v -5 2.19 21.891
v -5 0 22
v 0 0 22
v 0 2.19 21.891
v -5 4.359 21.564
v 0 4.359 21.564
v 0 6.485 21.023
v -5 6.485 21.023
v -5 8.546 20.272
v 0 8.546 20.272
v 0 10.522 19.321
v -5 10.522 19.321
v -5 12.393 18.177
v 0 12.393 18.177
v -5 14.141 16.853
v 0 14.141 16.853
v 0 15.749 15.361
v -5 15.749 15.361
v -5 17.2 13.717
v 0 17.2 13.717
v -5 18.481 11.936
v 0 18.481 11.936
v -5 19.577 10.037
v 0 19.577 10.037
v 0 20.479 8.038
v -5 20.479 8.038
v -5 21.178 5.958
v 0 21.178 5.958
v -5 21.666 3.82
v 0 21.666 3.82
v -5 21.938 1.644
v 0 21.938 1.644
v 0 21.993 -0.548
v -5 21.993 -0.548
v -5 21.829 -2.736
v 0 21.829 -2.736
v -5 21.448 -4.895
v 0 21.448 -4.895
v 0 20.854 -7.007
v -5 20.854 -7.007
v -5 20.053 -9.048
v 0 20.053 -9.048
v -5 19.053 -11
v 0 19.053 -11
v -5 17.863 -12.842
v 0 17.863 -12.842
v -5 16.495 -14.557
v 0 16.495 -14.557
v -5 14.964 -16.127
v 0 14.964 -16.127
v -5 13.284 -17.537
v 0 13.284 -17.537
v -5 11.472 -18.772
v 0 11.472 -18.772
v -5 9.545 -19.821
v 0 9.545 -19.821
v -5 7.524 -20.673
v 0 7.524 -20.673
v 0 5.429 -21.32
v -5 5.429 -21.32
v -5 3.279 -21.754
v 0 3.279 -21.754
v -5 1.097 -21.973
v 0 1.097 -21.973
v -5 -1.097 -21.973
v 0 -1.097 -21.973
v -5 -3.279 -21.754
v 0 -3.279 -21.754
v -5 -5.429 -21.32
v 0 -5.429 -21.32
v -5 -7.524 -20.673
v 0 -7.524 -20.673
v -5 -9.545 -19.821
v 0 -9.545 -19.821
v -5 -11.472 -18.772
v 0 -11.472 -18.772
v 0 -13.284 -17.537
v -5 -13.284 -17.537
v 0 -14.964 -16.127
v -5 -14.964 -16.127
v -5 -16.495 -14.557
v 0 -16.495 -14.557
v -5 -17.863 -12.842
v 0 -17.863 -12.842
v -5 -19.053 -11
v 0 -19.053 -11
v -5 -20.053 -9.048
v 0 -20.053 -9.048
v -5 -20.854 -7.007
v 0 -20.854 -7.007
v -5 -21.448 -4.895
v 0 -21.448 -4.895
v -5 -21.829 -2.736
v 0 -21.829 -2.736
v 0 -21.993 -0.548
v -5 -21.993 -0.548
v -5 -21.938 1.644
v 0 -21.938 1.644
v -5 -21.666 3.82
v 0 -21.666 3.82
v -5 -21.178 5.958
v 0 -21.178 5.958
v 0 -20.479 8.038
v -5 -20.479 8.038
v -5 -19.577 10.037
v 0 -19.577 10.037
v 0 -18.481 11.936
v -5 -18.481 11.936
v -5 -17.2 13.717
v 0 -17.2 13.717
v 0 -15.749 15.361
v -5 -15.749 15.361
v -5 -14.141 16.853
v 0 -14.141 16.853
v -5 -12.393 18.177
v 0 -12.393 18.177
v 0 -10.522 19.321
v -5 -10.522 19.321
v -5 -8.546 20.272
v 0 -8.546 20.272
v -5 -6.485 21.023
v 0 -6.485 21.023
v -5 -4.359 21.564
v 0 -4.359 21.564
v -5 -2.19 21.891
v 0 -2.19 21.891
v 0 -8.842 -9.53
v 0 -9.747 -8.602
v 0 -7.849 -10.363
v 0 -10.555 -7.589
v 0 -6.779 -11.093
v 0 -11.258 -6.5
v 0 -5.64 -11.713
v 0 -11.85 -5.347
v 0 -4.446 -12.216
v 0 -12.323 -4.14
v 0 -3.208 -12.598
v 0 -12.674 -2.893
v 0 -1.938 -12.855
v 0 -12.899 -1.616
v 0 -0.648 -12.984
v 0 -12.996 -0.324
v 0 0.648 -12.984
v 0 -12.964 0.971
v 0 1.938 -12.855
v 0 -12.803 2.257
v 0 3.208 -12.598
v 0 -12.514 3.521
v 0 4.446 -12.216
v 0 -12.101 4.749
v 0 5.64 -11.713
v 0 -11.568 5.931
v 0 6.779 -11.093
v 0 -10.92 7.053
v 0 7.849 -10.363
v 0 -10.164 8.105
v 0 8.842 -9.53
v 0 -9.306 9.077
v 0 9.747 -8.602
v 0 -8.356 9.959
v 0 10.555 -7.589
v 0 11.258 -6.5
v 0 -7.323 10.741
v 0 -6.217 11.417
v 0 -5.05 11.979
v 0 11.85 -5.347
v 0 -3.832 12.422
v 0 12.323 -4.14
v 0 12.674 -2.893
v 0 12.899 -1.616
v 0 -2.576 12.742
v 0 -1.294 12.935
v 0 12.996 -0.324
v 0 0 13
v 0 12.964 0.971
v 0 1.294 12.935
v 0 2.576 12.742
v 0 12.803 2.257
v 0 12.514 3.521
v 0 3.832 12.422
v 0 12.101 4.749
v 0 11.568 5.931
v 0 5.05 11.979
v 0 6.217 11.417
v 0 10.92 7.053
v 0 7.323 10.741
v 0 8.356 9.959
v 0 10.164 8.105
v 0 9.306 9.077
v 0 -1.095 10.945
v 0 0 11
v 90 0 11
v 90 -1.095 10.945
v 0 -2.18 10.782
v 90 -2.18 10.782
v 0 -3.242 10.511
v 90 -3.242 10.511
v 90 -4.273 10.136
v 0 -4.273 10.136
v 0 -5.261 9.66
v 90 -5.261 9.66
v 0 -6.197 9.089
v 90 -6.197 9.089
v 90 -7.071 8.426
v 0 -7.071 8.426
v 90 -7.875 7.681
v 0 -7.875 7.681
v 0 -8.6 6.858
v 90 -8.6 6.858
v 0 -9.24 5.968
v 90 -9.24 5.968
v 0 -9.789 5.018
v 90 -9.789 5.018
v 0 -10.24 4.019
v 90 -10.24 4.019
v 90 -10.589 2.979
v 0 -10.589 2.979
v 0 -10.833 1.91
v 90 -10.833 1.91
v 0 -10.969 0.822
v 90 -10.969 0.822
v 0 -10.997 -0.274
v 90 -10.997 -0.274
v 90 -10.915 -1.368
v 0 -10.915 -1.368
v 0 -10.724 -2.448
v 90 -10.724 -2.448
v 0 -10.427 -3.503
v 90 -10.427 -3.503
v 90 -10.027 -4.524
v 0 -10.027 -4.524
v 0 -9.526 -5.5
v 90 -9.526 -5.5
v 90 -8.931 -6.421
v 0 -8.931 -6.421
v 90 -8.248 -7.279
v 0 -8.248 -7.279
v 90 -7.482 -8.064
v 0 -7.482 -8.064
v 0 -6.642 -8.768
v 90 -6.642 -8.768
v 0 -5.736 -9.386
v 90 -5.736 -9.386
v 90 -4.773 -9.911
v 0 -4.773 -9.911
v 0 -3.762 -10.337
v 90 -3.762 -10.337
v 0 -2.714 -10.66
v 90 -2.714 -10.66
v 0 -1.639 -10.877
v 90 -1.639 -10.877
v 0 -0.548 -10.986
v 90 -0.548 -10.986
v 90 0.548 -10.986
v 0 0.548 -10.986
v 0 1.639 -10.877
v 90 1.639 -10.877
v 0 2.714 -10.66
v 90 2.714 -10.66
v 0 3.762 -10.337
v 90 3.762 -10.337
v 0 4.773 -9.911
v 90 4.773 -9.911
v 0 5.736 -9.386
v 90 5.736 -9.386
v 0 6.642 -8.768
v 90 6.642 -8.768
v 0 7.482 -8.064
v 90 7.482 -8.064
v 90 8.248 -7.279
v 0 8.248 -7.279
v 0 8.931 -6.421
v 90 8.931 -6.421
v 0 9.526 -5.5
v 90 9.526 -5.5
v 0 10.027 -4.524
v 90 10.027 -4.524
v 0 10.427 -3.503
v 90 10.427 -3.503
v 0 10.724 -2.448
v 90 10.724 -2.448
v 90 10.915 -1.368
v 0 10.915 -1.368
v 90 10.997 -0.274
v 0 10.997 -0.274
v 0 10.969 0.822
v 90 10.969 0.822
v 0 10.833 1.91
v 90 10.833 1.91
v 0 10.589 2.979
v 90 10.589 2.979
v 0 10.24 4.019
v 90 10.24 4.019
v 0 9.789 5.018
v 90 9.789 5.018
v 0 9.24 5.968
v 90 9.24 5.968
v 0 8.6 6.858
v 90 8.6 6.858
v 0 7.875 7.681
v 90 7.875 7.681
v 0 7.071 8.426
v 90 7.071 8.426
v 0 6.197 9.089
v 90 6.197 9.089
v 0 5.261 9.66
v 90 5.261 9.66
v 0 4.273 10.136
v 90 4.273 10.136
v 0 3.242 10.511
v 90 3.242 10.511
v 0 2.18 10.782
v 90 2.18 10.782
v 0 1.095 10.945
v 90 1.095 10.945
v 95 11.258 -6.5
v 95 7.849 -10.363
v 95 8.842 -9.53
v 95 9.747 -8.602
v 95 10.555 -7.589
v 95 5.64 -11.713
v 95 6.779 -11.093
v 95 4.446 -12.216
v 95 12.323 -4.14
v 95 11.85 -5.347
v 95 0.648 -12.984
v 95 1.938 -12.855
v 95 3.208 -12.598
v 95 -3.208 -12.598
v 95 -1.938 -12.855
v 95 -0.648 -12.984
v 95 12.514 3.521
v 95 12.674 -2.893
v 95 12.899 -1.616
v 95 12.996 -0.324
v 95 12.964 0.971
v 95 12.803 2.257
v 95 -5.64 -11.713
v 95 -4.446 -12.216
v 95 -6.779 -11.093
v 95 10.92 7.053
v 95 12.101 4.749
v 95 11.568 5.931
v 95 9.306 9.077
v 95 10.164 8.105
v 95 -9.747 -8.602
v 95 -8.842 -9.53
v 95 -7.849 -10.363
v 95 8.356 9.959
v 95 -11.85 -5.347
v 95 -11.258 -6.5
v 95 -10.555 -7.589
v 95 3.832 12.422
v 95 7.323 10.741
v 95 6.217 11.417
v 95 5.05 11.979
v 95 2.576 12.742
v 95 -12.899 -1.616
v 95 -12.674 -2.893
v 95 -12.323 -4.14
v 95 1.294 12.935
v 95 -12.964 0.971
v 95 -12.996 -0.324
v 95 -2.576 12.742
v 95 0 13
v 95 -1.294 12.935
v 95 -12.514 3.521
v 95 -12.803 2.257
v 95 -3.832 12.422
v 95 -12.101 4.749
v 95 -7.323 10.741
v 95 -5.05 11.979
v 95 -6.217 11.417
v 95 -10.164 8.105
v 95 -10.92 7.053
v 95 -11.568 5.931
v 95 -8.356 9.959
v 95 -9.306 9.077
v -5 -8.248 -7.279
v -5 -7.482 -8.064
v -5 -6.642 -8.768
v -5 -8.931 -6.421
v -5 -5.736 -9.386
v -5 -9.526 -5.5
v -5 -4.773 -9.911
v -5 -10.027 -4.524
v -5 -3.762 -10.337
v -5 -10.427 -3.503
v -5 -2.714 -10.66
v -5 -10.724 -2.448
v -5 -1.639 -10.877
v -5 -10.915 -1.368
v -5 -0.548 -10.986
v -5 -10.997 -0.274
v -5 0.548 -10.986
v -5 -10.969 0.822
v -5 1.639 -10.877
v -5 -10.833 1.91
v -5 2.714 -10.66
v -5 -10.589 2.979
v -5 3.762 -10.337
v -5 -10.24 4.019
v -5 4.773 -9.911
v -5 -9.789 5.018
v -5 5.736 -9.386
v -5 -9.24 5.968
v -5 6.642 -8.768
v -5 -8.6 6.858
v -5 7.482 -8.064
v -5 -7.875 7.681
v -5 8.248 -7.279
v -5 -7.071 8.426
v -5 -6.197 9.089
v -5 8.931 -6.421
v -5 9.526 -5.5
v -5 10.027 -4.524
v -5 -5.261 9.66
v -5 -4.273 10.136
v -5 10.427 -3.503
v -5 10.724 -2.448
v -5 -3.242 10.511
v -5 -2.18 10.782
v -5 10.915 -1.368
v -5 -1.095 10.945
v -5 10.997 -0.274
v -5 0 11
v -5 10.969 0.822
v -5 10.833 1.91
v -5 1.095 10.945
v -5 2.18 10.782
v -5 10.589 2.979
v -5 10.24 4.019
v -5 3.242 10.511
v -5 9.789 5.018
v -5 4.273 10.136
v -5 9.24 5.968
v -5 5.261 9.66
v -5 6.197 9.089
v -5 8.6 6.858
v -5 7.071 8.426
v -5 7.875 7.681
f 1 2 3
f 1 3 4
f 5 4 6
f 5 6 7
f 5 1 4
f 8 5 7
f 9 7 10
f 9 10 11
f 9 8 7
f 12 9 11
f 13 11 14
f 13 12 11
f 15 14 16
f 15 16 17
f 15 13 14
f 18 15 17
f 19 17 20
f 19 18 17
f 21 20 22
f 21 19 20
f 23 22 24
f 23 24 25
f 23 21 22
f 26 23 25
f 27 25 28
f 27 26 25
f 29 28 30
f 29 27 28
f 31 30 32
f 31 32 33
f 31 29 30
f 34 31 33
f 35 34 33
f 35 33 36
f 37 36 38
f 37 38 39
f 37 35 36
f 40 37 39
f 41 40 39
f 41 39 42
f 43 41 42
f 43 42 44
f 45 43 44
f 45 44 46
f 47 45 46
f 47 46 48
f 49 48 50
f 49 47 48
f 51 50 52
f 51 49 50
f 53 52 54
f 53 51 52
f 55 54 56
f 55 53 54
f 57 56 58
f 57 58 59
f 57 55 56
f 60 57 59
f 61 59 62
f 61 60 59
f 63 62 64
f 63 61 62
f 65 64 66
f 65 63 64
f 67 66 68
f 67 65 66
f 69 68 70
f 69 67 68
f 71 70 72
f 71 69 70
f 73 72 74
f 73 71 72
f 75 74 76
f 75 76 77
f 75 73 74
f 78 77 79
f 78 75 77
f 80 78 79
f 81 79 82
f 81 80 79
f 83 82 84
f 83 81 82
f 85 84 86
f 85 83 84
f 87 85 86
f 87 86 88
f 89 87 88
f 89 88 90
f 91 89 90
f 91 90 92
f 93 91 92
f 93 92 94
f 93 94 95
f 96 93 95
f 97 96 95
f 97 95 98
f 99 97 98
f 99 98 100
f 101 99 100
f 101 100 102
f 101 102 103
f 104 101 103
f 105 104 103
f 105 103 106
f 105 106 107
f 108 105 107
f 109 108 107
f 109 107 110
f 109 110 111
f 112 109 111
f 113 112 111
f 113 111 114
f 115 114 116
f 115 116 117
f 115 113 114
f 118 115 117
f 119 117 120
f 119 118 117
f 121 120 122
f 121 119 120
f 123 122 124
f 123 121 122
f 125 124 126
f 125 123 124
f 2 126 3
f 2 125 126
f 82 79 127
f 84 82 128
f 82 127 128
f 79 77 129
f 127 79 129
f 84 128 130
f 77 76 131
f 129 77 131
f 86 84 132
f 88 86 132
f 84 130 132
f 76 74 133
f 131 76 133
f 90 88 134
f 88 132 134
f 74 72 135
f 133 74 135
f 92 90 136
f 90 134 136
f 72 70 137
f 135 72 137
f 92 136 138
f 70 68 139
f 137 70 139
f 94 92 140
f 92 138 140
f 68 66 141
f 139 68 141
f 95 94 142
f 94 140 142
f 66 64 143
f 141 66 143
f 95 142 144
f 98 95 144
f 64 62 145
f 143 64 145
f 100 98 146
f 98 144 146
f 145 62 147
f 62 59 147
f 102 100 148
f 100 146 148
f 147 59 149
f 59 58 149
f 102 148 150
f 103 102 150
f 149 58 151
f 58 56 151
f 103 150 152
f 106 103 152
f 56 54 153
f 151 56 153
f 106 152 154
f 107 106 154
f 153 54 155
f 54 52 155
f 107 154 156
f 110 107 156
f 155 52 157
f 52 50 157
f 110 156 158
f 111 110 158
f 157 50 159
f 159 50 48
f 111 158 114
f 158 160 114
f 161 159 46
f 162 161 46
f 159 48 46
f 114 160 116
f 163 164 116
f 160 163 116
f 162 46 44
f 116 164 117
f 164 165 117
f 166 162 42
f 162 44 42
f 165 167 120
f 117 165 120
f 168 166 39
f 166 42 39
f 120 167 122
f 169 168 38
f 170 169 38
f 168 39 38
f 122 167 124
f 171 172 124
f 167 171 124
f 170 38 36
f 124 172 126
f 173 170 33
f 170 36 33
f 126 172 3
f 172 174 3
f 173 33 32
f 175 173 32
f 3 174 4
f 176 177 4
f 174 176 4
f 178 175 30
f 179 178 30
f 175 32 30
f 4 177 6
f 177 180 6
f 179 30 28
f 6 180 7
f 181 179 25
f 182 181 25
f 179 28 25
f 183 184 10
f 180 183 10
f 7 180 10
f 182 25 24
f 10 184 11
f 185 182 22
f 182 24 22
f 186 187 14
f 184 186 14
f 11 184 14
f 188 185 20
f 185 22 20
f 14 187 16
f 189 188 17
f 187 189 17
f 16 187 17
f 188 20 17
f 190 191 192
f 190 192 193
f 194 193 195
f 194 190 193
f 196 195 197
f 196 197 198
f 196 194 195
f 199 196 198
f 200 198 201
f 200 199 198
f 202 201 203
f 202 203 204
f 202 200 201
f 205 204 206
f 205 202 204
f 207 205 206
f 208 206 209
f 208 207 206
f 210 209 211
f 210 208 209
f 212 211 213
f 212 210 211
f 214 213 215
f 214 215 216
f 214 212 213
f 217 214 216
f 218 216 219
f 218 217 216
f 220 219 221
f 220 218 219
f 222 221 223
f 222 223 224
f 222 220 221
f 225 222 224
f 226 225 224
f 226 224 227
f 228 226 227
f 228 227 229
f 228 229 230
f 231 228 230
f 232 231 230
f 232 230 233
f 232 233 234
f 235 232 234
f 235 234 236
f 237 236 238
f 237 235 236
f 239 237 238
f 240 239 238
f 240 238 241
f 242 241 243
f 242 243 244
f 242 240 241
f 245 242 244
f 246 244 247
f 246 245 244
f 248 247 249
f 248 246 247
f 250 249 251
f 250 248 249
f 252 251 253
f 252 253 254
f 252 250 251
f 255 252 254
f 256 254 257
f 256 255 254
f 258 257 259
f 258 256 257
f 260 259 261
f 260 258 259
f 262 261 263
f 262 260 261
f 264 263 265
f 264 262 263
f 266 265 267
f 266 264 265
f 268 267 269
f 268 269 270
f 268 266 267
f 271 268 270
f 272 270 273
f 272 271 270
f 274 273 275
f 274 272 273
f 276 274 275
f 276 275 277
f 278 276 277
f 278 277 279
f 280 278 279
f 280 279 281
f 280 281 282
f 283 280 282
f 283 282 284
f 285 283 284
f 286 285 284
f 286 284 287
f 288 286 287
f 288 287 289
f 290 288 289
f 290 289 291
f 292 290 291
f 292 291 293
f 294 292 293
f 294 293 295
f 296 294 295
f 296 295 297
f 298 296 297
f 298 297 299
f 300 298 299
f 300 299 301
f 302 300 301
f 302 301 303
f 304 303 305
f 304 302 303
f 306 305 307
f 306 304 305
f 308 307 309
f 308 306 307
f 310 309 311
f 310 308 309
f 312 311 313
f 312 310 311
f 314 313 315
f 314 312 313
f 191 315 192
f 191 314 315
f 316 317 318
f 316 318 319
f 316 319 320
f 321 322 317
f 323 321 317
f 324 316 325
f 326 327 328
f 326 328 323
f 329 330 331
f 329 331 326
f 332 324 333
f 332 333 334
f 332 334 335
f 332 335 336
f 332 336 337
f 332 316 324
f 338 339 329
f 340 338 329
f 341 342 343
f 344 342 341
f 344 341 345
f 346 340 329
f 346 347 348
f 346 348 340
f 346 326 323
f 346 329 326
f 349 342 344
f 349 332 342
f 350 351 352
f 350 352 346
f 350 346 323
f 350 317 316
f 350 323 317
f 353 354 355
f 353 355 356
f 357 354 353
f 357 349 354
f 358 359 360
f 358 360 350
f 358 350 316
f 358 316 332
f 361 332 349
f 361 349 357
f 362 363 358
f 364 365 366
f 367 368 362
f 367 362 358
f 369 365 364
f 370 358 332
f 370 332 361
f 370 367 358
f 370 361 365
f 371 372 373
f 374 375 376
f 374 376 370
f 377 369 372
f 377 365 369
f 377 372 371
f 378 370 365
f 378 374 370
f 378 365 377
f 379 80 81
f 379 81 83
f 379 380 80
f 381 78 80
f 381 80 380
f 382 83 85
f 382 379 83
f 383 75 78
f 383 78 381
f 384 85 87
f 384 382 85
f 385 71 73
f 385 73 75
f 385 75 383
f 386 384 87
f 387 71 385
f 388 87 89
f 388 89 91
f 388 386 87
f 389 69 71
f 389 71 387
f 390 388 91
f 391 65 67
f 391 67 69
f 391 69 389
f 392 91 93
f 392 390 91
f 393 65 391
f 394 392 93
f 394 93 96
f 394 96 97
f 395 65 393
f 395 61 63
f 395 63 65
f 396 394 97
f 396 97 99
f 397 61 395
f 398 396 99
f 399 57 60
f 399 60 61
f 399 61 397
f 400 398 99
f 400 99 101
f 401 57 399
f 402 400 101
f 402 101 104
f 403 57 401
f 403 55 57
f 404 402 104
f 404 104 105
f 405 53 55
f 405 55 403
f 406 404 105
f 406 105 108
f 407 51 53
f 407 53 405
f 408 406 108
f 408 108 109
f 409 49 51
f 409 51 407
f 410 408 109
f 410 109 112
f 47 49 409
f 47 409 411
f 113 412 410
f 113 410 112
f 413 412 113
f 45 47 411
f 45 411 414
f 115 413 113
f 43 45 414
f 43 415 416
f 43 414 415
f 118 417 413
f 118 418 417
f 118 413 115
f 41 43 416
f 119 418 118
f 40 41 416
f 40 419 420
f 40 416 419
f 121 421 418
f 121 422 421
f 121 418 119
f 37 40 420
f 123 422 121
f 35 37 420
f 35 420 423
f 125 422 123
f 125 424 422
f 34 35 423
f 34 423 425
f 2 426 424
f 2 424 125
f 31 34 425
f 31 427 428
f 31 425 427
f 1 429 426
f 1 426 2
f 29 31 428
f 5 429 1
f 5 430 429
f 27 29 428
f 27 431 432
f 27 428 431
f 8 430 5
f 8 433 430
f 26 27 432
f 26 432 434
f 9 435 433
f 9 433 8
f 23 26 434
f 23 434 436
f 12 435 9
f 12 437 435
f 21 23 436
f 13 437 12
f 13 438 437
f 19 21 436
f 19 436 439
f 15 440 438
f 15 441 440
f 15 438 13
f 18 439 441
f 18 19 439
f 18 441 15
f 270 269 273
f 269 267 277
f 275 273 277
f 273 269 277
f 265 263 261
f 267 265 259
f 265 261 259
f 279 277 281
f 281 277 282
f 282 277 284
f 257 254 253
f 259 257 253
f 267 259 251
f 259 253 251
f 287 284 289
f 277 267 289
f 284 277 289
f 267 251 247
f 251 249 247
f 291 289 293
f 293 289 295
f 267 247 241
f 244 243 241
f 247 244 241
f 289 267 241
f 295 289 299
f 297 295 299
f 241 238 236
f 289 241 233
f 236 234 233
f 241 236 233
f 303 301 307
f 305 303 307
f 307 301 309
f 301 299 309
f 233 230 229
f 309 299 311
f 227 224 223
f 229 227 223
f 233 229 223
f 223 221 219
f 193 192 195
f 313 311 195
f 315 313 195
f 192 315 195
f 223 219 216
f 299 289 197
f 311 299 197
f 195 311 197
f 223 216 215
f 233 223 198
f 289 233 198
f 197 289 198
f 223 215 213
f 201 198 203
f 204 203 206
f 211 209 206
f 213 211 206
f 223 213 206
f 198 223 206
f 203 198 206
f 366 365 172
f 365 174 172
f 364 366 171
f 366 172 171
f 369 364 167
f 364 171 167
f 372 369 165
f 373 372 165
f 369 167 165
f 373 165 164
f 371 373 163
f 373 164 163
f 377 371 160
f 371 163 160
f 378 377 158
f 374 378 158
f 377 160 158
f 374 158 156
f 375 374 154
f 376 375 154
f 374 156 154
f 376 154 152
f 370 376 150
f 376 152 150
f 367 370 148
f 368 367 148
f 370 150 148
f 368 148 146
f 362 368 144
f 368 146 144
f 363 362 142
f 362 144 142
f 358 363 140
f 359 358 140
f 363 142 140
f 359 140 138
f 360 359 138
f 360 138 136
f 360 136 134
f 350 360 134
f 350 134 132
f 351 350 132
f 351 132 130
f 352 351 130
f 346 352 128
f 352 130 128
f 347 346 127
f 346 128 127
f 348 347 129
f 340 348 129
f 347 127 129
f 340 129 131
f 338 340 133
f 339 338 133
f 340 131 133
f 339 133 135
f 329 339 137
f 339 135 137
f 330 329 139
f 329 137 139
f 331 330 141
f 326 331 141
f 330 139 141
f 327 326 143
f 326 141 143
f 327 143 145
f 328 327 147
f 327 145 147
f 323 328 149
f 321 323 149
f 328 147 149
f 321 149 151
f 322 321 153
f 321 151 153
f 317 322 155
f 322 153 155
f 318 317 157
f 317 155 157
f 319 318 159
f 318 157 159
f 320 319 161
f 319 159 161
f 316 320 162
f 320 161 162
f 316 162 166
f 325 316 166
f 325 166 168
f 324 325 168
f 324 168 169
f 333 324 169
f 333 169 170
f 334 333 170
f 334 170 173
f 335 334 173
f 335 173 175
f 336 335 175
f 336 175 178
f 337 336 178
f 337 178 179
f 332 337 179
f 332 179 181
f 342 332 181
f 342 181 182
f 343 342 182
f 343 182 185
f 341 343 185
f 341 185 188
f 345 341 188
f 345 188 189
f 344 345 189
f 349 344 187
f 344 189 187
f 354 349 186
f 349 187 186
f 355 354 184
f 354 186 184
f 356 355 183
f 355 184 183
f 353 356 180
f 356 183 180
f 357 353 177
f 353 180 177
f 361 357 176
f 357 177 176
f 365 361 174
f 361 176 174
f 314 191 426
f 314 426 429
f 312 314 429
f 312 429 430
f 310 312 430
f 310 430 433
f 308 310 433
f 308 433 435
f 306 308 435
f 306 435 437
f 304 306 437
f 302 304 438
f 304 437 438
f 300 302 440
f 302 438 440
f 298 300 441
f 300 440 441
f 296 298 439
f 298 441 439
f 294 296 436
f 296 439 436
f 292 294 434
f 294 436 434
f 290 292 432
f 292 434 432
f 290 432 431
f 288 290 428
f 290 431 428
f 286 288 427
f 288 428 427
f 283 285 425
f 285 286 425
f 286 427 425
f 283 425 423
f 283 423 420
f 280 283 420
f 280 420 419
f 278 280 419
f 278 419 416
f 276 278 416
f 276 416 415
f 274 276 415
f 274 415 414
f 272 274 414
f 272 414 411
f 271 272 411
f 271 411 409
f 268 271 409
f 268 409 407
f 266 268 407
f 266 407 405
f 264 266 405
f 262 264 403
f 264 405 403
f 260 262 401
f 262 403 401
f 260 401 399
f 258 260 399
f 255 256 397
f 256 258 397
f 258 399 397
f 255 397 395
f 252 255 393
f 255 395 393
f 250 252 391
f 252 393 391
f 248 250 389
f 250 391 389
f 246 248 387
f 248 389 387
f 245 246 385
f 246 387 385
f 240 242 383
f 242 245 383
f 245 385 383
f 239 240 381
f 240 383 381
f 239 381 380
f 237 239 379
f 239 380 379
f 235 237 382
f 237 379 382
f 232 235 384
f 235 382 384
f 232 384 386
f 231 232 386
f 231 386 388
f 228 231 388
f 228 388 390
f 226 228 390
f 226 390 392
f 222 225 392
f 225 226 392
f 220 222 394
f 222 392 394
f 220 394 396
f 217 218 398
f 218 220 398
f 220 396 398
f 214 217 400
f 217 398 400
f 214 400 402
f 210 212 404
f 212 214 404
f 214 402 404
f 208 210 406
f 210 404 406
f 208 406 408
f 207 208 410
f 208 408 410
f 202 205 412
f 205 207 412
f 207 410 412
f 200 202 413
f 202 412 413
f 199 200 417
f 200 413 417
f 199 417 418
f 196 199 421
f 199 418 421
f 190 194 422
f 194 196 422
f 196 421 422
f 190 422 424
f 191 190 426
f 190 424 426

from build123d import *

# Parameters (mm, degrees)
SKETCH1_R           = 13
SKETCH1_R_2         = 11
BOSS_EXTRUDE1_DEPTH = 90
SKETCH2_R           = 13
BOSS_EXTRUDE2_DEPTH = 5
BOSS_EXTRUDE4_START = 5
SKETCH3_R           = 22
SKETCH3_R_2         = 11
BOSS_EXTRUDE4_DEPTH = 5


with BuildPart() as part:
    # Sketch1 → Boss-Extrude1 (new body)
    with BuildSketch(Plane(origin=(0, 0, 0), x_dir=(0, 0, -1), z_dir=(1, 0, 0))):
        with Locations(Location((0, 0, 0), (0, 0, 180))):
            Circle(SKETCH1_R)
        with Locations(Location((0, 0, 0), (0, 0, 180))):
            Circle(SKETCH1_R_2, mode=Mode.SUBTRACT)
    extrude(amount=BOSS_EXTRUDE1_DEPTH)

    # Sketch2 → Boss-Extrude2 (add)
    with BuildSketch(Plane(origin=(90, 0, 0), x_dir=(0, 0, -1), z_dir=(1, 0, 0))):
        with Locations(Location((0, 0, 0), (0, 0, 180))):
            Circle(SKETCH2_R)
    extrude(amount=BOSS_EXTRUDE2_DEPTH)

    # Sketch3 → Boss-Extrude4 (add)
    with BuildSketch(Plane.ZY.offset(BOSS_EXTRUDE4_START)):
        Circle(SKETCH3_R)
        Circle(SKETCH3_R_2, mode=Mode.SUBTRACT)
    extrude(amount=-BOSS_EXTRUDE4_DEPTH)


solid = part.part
